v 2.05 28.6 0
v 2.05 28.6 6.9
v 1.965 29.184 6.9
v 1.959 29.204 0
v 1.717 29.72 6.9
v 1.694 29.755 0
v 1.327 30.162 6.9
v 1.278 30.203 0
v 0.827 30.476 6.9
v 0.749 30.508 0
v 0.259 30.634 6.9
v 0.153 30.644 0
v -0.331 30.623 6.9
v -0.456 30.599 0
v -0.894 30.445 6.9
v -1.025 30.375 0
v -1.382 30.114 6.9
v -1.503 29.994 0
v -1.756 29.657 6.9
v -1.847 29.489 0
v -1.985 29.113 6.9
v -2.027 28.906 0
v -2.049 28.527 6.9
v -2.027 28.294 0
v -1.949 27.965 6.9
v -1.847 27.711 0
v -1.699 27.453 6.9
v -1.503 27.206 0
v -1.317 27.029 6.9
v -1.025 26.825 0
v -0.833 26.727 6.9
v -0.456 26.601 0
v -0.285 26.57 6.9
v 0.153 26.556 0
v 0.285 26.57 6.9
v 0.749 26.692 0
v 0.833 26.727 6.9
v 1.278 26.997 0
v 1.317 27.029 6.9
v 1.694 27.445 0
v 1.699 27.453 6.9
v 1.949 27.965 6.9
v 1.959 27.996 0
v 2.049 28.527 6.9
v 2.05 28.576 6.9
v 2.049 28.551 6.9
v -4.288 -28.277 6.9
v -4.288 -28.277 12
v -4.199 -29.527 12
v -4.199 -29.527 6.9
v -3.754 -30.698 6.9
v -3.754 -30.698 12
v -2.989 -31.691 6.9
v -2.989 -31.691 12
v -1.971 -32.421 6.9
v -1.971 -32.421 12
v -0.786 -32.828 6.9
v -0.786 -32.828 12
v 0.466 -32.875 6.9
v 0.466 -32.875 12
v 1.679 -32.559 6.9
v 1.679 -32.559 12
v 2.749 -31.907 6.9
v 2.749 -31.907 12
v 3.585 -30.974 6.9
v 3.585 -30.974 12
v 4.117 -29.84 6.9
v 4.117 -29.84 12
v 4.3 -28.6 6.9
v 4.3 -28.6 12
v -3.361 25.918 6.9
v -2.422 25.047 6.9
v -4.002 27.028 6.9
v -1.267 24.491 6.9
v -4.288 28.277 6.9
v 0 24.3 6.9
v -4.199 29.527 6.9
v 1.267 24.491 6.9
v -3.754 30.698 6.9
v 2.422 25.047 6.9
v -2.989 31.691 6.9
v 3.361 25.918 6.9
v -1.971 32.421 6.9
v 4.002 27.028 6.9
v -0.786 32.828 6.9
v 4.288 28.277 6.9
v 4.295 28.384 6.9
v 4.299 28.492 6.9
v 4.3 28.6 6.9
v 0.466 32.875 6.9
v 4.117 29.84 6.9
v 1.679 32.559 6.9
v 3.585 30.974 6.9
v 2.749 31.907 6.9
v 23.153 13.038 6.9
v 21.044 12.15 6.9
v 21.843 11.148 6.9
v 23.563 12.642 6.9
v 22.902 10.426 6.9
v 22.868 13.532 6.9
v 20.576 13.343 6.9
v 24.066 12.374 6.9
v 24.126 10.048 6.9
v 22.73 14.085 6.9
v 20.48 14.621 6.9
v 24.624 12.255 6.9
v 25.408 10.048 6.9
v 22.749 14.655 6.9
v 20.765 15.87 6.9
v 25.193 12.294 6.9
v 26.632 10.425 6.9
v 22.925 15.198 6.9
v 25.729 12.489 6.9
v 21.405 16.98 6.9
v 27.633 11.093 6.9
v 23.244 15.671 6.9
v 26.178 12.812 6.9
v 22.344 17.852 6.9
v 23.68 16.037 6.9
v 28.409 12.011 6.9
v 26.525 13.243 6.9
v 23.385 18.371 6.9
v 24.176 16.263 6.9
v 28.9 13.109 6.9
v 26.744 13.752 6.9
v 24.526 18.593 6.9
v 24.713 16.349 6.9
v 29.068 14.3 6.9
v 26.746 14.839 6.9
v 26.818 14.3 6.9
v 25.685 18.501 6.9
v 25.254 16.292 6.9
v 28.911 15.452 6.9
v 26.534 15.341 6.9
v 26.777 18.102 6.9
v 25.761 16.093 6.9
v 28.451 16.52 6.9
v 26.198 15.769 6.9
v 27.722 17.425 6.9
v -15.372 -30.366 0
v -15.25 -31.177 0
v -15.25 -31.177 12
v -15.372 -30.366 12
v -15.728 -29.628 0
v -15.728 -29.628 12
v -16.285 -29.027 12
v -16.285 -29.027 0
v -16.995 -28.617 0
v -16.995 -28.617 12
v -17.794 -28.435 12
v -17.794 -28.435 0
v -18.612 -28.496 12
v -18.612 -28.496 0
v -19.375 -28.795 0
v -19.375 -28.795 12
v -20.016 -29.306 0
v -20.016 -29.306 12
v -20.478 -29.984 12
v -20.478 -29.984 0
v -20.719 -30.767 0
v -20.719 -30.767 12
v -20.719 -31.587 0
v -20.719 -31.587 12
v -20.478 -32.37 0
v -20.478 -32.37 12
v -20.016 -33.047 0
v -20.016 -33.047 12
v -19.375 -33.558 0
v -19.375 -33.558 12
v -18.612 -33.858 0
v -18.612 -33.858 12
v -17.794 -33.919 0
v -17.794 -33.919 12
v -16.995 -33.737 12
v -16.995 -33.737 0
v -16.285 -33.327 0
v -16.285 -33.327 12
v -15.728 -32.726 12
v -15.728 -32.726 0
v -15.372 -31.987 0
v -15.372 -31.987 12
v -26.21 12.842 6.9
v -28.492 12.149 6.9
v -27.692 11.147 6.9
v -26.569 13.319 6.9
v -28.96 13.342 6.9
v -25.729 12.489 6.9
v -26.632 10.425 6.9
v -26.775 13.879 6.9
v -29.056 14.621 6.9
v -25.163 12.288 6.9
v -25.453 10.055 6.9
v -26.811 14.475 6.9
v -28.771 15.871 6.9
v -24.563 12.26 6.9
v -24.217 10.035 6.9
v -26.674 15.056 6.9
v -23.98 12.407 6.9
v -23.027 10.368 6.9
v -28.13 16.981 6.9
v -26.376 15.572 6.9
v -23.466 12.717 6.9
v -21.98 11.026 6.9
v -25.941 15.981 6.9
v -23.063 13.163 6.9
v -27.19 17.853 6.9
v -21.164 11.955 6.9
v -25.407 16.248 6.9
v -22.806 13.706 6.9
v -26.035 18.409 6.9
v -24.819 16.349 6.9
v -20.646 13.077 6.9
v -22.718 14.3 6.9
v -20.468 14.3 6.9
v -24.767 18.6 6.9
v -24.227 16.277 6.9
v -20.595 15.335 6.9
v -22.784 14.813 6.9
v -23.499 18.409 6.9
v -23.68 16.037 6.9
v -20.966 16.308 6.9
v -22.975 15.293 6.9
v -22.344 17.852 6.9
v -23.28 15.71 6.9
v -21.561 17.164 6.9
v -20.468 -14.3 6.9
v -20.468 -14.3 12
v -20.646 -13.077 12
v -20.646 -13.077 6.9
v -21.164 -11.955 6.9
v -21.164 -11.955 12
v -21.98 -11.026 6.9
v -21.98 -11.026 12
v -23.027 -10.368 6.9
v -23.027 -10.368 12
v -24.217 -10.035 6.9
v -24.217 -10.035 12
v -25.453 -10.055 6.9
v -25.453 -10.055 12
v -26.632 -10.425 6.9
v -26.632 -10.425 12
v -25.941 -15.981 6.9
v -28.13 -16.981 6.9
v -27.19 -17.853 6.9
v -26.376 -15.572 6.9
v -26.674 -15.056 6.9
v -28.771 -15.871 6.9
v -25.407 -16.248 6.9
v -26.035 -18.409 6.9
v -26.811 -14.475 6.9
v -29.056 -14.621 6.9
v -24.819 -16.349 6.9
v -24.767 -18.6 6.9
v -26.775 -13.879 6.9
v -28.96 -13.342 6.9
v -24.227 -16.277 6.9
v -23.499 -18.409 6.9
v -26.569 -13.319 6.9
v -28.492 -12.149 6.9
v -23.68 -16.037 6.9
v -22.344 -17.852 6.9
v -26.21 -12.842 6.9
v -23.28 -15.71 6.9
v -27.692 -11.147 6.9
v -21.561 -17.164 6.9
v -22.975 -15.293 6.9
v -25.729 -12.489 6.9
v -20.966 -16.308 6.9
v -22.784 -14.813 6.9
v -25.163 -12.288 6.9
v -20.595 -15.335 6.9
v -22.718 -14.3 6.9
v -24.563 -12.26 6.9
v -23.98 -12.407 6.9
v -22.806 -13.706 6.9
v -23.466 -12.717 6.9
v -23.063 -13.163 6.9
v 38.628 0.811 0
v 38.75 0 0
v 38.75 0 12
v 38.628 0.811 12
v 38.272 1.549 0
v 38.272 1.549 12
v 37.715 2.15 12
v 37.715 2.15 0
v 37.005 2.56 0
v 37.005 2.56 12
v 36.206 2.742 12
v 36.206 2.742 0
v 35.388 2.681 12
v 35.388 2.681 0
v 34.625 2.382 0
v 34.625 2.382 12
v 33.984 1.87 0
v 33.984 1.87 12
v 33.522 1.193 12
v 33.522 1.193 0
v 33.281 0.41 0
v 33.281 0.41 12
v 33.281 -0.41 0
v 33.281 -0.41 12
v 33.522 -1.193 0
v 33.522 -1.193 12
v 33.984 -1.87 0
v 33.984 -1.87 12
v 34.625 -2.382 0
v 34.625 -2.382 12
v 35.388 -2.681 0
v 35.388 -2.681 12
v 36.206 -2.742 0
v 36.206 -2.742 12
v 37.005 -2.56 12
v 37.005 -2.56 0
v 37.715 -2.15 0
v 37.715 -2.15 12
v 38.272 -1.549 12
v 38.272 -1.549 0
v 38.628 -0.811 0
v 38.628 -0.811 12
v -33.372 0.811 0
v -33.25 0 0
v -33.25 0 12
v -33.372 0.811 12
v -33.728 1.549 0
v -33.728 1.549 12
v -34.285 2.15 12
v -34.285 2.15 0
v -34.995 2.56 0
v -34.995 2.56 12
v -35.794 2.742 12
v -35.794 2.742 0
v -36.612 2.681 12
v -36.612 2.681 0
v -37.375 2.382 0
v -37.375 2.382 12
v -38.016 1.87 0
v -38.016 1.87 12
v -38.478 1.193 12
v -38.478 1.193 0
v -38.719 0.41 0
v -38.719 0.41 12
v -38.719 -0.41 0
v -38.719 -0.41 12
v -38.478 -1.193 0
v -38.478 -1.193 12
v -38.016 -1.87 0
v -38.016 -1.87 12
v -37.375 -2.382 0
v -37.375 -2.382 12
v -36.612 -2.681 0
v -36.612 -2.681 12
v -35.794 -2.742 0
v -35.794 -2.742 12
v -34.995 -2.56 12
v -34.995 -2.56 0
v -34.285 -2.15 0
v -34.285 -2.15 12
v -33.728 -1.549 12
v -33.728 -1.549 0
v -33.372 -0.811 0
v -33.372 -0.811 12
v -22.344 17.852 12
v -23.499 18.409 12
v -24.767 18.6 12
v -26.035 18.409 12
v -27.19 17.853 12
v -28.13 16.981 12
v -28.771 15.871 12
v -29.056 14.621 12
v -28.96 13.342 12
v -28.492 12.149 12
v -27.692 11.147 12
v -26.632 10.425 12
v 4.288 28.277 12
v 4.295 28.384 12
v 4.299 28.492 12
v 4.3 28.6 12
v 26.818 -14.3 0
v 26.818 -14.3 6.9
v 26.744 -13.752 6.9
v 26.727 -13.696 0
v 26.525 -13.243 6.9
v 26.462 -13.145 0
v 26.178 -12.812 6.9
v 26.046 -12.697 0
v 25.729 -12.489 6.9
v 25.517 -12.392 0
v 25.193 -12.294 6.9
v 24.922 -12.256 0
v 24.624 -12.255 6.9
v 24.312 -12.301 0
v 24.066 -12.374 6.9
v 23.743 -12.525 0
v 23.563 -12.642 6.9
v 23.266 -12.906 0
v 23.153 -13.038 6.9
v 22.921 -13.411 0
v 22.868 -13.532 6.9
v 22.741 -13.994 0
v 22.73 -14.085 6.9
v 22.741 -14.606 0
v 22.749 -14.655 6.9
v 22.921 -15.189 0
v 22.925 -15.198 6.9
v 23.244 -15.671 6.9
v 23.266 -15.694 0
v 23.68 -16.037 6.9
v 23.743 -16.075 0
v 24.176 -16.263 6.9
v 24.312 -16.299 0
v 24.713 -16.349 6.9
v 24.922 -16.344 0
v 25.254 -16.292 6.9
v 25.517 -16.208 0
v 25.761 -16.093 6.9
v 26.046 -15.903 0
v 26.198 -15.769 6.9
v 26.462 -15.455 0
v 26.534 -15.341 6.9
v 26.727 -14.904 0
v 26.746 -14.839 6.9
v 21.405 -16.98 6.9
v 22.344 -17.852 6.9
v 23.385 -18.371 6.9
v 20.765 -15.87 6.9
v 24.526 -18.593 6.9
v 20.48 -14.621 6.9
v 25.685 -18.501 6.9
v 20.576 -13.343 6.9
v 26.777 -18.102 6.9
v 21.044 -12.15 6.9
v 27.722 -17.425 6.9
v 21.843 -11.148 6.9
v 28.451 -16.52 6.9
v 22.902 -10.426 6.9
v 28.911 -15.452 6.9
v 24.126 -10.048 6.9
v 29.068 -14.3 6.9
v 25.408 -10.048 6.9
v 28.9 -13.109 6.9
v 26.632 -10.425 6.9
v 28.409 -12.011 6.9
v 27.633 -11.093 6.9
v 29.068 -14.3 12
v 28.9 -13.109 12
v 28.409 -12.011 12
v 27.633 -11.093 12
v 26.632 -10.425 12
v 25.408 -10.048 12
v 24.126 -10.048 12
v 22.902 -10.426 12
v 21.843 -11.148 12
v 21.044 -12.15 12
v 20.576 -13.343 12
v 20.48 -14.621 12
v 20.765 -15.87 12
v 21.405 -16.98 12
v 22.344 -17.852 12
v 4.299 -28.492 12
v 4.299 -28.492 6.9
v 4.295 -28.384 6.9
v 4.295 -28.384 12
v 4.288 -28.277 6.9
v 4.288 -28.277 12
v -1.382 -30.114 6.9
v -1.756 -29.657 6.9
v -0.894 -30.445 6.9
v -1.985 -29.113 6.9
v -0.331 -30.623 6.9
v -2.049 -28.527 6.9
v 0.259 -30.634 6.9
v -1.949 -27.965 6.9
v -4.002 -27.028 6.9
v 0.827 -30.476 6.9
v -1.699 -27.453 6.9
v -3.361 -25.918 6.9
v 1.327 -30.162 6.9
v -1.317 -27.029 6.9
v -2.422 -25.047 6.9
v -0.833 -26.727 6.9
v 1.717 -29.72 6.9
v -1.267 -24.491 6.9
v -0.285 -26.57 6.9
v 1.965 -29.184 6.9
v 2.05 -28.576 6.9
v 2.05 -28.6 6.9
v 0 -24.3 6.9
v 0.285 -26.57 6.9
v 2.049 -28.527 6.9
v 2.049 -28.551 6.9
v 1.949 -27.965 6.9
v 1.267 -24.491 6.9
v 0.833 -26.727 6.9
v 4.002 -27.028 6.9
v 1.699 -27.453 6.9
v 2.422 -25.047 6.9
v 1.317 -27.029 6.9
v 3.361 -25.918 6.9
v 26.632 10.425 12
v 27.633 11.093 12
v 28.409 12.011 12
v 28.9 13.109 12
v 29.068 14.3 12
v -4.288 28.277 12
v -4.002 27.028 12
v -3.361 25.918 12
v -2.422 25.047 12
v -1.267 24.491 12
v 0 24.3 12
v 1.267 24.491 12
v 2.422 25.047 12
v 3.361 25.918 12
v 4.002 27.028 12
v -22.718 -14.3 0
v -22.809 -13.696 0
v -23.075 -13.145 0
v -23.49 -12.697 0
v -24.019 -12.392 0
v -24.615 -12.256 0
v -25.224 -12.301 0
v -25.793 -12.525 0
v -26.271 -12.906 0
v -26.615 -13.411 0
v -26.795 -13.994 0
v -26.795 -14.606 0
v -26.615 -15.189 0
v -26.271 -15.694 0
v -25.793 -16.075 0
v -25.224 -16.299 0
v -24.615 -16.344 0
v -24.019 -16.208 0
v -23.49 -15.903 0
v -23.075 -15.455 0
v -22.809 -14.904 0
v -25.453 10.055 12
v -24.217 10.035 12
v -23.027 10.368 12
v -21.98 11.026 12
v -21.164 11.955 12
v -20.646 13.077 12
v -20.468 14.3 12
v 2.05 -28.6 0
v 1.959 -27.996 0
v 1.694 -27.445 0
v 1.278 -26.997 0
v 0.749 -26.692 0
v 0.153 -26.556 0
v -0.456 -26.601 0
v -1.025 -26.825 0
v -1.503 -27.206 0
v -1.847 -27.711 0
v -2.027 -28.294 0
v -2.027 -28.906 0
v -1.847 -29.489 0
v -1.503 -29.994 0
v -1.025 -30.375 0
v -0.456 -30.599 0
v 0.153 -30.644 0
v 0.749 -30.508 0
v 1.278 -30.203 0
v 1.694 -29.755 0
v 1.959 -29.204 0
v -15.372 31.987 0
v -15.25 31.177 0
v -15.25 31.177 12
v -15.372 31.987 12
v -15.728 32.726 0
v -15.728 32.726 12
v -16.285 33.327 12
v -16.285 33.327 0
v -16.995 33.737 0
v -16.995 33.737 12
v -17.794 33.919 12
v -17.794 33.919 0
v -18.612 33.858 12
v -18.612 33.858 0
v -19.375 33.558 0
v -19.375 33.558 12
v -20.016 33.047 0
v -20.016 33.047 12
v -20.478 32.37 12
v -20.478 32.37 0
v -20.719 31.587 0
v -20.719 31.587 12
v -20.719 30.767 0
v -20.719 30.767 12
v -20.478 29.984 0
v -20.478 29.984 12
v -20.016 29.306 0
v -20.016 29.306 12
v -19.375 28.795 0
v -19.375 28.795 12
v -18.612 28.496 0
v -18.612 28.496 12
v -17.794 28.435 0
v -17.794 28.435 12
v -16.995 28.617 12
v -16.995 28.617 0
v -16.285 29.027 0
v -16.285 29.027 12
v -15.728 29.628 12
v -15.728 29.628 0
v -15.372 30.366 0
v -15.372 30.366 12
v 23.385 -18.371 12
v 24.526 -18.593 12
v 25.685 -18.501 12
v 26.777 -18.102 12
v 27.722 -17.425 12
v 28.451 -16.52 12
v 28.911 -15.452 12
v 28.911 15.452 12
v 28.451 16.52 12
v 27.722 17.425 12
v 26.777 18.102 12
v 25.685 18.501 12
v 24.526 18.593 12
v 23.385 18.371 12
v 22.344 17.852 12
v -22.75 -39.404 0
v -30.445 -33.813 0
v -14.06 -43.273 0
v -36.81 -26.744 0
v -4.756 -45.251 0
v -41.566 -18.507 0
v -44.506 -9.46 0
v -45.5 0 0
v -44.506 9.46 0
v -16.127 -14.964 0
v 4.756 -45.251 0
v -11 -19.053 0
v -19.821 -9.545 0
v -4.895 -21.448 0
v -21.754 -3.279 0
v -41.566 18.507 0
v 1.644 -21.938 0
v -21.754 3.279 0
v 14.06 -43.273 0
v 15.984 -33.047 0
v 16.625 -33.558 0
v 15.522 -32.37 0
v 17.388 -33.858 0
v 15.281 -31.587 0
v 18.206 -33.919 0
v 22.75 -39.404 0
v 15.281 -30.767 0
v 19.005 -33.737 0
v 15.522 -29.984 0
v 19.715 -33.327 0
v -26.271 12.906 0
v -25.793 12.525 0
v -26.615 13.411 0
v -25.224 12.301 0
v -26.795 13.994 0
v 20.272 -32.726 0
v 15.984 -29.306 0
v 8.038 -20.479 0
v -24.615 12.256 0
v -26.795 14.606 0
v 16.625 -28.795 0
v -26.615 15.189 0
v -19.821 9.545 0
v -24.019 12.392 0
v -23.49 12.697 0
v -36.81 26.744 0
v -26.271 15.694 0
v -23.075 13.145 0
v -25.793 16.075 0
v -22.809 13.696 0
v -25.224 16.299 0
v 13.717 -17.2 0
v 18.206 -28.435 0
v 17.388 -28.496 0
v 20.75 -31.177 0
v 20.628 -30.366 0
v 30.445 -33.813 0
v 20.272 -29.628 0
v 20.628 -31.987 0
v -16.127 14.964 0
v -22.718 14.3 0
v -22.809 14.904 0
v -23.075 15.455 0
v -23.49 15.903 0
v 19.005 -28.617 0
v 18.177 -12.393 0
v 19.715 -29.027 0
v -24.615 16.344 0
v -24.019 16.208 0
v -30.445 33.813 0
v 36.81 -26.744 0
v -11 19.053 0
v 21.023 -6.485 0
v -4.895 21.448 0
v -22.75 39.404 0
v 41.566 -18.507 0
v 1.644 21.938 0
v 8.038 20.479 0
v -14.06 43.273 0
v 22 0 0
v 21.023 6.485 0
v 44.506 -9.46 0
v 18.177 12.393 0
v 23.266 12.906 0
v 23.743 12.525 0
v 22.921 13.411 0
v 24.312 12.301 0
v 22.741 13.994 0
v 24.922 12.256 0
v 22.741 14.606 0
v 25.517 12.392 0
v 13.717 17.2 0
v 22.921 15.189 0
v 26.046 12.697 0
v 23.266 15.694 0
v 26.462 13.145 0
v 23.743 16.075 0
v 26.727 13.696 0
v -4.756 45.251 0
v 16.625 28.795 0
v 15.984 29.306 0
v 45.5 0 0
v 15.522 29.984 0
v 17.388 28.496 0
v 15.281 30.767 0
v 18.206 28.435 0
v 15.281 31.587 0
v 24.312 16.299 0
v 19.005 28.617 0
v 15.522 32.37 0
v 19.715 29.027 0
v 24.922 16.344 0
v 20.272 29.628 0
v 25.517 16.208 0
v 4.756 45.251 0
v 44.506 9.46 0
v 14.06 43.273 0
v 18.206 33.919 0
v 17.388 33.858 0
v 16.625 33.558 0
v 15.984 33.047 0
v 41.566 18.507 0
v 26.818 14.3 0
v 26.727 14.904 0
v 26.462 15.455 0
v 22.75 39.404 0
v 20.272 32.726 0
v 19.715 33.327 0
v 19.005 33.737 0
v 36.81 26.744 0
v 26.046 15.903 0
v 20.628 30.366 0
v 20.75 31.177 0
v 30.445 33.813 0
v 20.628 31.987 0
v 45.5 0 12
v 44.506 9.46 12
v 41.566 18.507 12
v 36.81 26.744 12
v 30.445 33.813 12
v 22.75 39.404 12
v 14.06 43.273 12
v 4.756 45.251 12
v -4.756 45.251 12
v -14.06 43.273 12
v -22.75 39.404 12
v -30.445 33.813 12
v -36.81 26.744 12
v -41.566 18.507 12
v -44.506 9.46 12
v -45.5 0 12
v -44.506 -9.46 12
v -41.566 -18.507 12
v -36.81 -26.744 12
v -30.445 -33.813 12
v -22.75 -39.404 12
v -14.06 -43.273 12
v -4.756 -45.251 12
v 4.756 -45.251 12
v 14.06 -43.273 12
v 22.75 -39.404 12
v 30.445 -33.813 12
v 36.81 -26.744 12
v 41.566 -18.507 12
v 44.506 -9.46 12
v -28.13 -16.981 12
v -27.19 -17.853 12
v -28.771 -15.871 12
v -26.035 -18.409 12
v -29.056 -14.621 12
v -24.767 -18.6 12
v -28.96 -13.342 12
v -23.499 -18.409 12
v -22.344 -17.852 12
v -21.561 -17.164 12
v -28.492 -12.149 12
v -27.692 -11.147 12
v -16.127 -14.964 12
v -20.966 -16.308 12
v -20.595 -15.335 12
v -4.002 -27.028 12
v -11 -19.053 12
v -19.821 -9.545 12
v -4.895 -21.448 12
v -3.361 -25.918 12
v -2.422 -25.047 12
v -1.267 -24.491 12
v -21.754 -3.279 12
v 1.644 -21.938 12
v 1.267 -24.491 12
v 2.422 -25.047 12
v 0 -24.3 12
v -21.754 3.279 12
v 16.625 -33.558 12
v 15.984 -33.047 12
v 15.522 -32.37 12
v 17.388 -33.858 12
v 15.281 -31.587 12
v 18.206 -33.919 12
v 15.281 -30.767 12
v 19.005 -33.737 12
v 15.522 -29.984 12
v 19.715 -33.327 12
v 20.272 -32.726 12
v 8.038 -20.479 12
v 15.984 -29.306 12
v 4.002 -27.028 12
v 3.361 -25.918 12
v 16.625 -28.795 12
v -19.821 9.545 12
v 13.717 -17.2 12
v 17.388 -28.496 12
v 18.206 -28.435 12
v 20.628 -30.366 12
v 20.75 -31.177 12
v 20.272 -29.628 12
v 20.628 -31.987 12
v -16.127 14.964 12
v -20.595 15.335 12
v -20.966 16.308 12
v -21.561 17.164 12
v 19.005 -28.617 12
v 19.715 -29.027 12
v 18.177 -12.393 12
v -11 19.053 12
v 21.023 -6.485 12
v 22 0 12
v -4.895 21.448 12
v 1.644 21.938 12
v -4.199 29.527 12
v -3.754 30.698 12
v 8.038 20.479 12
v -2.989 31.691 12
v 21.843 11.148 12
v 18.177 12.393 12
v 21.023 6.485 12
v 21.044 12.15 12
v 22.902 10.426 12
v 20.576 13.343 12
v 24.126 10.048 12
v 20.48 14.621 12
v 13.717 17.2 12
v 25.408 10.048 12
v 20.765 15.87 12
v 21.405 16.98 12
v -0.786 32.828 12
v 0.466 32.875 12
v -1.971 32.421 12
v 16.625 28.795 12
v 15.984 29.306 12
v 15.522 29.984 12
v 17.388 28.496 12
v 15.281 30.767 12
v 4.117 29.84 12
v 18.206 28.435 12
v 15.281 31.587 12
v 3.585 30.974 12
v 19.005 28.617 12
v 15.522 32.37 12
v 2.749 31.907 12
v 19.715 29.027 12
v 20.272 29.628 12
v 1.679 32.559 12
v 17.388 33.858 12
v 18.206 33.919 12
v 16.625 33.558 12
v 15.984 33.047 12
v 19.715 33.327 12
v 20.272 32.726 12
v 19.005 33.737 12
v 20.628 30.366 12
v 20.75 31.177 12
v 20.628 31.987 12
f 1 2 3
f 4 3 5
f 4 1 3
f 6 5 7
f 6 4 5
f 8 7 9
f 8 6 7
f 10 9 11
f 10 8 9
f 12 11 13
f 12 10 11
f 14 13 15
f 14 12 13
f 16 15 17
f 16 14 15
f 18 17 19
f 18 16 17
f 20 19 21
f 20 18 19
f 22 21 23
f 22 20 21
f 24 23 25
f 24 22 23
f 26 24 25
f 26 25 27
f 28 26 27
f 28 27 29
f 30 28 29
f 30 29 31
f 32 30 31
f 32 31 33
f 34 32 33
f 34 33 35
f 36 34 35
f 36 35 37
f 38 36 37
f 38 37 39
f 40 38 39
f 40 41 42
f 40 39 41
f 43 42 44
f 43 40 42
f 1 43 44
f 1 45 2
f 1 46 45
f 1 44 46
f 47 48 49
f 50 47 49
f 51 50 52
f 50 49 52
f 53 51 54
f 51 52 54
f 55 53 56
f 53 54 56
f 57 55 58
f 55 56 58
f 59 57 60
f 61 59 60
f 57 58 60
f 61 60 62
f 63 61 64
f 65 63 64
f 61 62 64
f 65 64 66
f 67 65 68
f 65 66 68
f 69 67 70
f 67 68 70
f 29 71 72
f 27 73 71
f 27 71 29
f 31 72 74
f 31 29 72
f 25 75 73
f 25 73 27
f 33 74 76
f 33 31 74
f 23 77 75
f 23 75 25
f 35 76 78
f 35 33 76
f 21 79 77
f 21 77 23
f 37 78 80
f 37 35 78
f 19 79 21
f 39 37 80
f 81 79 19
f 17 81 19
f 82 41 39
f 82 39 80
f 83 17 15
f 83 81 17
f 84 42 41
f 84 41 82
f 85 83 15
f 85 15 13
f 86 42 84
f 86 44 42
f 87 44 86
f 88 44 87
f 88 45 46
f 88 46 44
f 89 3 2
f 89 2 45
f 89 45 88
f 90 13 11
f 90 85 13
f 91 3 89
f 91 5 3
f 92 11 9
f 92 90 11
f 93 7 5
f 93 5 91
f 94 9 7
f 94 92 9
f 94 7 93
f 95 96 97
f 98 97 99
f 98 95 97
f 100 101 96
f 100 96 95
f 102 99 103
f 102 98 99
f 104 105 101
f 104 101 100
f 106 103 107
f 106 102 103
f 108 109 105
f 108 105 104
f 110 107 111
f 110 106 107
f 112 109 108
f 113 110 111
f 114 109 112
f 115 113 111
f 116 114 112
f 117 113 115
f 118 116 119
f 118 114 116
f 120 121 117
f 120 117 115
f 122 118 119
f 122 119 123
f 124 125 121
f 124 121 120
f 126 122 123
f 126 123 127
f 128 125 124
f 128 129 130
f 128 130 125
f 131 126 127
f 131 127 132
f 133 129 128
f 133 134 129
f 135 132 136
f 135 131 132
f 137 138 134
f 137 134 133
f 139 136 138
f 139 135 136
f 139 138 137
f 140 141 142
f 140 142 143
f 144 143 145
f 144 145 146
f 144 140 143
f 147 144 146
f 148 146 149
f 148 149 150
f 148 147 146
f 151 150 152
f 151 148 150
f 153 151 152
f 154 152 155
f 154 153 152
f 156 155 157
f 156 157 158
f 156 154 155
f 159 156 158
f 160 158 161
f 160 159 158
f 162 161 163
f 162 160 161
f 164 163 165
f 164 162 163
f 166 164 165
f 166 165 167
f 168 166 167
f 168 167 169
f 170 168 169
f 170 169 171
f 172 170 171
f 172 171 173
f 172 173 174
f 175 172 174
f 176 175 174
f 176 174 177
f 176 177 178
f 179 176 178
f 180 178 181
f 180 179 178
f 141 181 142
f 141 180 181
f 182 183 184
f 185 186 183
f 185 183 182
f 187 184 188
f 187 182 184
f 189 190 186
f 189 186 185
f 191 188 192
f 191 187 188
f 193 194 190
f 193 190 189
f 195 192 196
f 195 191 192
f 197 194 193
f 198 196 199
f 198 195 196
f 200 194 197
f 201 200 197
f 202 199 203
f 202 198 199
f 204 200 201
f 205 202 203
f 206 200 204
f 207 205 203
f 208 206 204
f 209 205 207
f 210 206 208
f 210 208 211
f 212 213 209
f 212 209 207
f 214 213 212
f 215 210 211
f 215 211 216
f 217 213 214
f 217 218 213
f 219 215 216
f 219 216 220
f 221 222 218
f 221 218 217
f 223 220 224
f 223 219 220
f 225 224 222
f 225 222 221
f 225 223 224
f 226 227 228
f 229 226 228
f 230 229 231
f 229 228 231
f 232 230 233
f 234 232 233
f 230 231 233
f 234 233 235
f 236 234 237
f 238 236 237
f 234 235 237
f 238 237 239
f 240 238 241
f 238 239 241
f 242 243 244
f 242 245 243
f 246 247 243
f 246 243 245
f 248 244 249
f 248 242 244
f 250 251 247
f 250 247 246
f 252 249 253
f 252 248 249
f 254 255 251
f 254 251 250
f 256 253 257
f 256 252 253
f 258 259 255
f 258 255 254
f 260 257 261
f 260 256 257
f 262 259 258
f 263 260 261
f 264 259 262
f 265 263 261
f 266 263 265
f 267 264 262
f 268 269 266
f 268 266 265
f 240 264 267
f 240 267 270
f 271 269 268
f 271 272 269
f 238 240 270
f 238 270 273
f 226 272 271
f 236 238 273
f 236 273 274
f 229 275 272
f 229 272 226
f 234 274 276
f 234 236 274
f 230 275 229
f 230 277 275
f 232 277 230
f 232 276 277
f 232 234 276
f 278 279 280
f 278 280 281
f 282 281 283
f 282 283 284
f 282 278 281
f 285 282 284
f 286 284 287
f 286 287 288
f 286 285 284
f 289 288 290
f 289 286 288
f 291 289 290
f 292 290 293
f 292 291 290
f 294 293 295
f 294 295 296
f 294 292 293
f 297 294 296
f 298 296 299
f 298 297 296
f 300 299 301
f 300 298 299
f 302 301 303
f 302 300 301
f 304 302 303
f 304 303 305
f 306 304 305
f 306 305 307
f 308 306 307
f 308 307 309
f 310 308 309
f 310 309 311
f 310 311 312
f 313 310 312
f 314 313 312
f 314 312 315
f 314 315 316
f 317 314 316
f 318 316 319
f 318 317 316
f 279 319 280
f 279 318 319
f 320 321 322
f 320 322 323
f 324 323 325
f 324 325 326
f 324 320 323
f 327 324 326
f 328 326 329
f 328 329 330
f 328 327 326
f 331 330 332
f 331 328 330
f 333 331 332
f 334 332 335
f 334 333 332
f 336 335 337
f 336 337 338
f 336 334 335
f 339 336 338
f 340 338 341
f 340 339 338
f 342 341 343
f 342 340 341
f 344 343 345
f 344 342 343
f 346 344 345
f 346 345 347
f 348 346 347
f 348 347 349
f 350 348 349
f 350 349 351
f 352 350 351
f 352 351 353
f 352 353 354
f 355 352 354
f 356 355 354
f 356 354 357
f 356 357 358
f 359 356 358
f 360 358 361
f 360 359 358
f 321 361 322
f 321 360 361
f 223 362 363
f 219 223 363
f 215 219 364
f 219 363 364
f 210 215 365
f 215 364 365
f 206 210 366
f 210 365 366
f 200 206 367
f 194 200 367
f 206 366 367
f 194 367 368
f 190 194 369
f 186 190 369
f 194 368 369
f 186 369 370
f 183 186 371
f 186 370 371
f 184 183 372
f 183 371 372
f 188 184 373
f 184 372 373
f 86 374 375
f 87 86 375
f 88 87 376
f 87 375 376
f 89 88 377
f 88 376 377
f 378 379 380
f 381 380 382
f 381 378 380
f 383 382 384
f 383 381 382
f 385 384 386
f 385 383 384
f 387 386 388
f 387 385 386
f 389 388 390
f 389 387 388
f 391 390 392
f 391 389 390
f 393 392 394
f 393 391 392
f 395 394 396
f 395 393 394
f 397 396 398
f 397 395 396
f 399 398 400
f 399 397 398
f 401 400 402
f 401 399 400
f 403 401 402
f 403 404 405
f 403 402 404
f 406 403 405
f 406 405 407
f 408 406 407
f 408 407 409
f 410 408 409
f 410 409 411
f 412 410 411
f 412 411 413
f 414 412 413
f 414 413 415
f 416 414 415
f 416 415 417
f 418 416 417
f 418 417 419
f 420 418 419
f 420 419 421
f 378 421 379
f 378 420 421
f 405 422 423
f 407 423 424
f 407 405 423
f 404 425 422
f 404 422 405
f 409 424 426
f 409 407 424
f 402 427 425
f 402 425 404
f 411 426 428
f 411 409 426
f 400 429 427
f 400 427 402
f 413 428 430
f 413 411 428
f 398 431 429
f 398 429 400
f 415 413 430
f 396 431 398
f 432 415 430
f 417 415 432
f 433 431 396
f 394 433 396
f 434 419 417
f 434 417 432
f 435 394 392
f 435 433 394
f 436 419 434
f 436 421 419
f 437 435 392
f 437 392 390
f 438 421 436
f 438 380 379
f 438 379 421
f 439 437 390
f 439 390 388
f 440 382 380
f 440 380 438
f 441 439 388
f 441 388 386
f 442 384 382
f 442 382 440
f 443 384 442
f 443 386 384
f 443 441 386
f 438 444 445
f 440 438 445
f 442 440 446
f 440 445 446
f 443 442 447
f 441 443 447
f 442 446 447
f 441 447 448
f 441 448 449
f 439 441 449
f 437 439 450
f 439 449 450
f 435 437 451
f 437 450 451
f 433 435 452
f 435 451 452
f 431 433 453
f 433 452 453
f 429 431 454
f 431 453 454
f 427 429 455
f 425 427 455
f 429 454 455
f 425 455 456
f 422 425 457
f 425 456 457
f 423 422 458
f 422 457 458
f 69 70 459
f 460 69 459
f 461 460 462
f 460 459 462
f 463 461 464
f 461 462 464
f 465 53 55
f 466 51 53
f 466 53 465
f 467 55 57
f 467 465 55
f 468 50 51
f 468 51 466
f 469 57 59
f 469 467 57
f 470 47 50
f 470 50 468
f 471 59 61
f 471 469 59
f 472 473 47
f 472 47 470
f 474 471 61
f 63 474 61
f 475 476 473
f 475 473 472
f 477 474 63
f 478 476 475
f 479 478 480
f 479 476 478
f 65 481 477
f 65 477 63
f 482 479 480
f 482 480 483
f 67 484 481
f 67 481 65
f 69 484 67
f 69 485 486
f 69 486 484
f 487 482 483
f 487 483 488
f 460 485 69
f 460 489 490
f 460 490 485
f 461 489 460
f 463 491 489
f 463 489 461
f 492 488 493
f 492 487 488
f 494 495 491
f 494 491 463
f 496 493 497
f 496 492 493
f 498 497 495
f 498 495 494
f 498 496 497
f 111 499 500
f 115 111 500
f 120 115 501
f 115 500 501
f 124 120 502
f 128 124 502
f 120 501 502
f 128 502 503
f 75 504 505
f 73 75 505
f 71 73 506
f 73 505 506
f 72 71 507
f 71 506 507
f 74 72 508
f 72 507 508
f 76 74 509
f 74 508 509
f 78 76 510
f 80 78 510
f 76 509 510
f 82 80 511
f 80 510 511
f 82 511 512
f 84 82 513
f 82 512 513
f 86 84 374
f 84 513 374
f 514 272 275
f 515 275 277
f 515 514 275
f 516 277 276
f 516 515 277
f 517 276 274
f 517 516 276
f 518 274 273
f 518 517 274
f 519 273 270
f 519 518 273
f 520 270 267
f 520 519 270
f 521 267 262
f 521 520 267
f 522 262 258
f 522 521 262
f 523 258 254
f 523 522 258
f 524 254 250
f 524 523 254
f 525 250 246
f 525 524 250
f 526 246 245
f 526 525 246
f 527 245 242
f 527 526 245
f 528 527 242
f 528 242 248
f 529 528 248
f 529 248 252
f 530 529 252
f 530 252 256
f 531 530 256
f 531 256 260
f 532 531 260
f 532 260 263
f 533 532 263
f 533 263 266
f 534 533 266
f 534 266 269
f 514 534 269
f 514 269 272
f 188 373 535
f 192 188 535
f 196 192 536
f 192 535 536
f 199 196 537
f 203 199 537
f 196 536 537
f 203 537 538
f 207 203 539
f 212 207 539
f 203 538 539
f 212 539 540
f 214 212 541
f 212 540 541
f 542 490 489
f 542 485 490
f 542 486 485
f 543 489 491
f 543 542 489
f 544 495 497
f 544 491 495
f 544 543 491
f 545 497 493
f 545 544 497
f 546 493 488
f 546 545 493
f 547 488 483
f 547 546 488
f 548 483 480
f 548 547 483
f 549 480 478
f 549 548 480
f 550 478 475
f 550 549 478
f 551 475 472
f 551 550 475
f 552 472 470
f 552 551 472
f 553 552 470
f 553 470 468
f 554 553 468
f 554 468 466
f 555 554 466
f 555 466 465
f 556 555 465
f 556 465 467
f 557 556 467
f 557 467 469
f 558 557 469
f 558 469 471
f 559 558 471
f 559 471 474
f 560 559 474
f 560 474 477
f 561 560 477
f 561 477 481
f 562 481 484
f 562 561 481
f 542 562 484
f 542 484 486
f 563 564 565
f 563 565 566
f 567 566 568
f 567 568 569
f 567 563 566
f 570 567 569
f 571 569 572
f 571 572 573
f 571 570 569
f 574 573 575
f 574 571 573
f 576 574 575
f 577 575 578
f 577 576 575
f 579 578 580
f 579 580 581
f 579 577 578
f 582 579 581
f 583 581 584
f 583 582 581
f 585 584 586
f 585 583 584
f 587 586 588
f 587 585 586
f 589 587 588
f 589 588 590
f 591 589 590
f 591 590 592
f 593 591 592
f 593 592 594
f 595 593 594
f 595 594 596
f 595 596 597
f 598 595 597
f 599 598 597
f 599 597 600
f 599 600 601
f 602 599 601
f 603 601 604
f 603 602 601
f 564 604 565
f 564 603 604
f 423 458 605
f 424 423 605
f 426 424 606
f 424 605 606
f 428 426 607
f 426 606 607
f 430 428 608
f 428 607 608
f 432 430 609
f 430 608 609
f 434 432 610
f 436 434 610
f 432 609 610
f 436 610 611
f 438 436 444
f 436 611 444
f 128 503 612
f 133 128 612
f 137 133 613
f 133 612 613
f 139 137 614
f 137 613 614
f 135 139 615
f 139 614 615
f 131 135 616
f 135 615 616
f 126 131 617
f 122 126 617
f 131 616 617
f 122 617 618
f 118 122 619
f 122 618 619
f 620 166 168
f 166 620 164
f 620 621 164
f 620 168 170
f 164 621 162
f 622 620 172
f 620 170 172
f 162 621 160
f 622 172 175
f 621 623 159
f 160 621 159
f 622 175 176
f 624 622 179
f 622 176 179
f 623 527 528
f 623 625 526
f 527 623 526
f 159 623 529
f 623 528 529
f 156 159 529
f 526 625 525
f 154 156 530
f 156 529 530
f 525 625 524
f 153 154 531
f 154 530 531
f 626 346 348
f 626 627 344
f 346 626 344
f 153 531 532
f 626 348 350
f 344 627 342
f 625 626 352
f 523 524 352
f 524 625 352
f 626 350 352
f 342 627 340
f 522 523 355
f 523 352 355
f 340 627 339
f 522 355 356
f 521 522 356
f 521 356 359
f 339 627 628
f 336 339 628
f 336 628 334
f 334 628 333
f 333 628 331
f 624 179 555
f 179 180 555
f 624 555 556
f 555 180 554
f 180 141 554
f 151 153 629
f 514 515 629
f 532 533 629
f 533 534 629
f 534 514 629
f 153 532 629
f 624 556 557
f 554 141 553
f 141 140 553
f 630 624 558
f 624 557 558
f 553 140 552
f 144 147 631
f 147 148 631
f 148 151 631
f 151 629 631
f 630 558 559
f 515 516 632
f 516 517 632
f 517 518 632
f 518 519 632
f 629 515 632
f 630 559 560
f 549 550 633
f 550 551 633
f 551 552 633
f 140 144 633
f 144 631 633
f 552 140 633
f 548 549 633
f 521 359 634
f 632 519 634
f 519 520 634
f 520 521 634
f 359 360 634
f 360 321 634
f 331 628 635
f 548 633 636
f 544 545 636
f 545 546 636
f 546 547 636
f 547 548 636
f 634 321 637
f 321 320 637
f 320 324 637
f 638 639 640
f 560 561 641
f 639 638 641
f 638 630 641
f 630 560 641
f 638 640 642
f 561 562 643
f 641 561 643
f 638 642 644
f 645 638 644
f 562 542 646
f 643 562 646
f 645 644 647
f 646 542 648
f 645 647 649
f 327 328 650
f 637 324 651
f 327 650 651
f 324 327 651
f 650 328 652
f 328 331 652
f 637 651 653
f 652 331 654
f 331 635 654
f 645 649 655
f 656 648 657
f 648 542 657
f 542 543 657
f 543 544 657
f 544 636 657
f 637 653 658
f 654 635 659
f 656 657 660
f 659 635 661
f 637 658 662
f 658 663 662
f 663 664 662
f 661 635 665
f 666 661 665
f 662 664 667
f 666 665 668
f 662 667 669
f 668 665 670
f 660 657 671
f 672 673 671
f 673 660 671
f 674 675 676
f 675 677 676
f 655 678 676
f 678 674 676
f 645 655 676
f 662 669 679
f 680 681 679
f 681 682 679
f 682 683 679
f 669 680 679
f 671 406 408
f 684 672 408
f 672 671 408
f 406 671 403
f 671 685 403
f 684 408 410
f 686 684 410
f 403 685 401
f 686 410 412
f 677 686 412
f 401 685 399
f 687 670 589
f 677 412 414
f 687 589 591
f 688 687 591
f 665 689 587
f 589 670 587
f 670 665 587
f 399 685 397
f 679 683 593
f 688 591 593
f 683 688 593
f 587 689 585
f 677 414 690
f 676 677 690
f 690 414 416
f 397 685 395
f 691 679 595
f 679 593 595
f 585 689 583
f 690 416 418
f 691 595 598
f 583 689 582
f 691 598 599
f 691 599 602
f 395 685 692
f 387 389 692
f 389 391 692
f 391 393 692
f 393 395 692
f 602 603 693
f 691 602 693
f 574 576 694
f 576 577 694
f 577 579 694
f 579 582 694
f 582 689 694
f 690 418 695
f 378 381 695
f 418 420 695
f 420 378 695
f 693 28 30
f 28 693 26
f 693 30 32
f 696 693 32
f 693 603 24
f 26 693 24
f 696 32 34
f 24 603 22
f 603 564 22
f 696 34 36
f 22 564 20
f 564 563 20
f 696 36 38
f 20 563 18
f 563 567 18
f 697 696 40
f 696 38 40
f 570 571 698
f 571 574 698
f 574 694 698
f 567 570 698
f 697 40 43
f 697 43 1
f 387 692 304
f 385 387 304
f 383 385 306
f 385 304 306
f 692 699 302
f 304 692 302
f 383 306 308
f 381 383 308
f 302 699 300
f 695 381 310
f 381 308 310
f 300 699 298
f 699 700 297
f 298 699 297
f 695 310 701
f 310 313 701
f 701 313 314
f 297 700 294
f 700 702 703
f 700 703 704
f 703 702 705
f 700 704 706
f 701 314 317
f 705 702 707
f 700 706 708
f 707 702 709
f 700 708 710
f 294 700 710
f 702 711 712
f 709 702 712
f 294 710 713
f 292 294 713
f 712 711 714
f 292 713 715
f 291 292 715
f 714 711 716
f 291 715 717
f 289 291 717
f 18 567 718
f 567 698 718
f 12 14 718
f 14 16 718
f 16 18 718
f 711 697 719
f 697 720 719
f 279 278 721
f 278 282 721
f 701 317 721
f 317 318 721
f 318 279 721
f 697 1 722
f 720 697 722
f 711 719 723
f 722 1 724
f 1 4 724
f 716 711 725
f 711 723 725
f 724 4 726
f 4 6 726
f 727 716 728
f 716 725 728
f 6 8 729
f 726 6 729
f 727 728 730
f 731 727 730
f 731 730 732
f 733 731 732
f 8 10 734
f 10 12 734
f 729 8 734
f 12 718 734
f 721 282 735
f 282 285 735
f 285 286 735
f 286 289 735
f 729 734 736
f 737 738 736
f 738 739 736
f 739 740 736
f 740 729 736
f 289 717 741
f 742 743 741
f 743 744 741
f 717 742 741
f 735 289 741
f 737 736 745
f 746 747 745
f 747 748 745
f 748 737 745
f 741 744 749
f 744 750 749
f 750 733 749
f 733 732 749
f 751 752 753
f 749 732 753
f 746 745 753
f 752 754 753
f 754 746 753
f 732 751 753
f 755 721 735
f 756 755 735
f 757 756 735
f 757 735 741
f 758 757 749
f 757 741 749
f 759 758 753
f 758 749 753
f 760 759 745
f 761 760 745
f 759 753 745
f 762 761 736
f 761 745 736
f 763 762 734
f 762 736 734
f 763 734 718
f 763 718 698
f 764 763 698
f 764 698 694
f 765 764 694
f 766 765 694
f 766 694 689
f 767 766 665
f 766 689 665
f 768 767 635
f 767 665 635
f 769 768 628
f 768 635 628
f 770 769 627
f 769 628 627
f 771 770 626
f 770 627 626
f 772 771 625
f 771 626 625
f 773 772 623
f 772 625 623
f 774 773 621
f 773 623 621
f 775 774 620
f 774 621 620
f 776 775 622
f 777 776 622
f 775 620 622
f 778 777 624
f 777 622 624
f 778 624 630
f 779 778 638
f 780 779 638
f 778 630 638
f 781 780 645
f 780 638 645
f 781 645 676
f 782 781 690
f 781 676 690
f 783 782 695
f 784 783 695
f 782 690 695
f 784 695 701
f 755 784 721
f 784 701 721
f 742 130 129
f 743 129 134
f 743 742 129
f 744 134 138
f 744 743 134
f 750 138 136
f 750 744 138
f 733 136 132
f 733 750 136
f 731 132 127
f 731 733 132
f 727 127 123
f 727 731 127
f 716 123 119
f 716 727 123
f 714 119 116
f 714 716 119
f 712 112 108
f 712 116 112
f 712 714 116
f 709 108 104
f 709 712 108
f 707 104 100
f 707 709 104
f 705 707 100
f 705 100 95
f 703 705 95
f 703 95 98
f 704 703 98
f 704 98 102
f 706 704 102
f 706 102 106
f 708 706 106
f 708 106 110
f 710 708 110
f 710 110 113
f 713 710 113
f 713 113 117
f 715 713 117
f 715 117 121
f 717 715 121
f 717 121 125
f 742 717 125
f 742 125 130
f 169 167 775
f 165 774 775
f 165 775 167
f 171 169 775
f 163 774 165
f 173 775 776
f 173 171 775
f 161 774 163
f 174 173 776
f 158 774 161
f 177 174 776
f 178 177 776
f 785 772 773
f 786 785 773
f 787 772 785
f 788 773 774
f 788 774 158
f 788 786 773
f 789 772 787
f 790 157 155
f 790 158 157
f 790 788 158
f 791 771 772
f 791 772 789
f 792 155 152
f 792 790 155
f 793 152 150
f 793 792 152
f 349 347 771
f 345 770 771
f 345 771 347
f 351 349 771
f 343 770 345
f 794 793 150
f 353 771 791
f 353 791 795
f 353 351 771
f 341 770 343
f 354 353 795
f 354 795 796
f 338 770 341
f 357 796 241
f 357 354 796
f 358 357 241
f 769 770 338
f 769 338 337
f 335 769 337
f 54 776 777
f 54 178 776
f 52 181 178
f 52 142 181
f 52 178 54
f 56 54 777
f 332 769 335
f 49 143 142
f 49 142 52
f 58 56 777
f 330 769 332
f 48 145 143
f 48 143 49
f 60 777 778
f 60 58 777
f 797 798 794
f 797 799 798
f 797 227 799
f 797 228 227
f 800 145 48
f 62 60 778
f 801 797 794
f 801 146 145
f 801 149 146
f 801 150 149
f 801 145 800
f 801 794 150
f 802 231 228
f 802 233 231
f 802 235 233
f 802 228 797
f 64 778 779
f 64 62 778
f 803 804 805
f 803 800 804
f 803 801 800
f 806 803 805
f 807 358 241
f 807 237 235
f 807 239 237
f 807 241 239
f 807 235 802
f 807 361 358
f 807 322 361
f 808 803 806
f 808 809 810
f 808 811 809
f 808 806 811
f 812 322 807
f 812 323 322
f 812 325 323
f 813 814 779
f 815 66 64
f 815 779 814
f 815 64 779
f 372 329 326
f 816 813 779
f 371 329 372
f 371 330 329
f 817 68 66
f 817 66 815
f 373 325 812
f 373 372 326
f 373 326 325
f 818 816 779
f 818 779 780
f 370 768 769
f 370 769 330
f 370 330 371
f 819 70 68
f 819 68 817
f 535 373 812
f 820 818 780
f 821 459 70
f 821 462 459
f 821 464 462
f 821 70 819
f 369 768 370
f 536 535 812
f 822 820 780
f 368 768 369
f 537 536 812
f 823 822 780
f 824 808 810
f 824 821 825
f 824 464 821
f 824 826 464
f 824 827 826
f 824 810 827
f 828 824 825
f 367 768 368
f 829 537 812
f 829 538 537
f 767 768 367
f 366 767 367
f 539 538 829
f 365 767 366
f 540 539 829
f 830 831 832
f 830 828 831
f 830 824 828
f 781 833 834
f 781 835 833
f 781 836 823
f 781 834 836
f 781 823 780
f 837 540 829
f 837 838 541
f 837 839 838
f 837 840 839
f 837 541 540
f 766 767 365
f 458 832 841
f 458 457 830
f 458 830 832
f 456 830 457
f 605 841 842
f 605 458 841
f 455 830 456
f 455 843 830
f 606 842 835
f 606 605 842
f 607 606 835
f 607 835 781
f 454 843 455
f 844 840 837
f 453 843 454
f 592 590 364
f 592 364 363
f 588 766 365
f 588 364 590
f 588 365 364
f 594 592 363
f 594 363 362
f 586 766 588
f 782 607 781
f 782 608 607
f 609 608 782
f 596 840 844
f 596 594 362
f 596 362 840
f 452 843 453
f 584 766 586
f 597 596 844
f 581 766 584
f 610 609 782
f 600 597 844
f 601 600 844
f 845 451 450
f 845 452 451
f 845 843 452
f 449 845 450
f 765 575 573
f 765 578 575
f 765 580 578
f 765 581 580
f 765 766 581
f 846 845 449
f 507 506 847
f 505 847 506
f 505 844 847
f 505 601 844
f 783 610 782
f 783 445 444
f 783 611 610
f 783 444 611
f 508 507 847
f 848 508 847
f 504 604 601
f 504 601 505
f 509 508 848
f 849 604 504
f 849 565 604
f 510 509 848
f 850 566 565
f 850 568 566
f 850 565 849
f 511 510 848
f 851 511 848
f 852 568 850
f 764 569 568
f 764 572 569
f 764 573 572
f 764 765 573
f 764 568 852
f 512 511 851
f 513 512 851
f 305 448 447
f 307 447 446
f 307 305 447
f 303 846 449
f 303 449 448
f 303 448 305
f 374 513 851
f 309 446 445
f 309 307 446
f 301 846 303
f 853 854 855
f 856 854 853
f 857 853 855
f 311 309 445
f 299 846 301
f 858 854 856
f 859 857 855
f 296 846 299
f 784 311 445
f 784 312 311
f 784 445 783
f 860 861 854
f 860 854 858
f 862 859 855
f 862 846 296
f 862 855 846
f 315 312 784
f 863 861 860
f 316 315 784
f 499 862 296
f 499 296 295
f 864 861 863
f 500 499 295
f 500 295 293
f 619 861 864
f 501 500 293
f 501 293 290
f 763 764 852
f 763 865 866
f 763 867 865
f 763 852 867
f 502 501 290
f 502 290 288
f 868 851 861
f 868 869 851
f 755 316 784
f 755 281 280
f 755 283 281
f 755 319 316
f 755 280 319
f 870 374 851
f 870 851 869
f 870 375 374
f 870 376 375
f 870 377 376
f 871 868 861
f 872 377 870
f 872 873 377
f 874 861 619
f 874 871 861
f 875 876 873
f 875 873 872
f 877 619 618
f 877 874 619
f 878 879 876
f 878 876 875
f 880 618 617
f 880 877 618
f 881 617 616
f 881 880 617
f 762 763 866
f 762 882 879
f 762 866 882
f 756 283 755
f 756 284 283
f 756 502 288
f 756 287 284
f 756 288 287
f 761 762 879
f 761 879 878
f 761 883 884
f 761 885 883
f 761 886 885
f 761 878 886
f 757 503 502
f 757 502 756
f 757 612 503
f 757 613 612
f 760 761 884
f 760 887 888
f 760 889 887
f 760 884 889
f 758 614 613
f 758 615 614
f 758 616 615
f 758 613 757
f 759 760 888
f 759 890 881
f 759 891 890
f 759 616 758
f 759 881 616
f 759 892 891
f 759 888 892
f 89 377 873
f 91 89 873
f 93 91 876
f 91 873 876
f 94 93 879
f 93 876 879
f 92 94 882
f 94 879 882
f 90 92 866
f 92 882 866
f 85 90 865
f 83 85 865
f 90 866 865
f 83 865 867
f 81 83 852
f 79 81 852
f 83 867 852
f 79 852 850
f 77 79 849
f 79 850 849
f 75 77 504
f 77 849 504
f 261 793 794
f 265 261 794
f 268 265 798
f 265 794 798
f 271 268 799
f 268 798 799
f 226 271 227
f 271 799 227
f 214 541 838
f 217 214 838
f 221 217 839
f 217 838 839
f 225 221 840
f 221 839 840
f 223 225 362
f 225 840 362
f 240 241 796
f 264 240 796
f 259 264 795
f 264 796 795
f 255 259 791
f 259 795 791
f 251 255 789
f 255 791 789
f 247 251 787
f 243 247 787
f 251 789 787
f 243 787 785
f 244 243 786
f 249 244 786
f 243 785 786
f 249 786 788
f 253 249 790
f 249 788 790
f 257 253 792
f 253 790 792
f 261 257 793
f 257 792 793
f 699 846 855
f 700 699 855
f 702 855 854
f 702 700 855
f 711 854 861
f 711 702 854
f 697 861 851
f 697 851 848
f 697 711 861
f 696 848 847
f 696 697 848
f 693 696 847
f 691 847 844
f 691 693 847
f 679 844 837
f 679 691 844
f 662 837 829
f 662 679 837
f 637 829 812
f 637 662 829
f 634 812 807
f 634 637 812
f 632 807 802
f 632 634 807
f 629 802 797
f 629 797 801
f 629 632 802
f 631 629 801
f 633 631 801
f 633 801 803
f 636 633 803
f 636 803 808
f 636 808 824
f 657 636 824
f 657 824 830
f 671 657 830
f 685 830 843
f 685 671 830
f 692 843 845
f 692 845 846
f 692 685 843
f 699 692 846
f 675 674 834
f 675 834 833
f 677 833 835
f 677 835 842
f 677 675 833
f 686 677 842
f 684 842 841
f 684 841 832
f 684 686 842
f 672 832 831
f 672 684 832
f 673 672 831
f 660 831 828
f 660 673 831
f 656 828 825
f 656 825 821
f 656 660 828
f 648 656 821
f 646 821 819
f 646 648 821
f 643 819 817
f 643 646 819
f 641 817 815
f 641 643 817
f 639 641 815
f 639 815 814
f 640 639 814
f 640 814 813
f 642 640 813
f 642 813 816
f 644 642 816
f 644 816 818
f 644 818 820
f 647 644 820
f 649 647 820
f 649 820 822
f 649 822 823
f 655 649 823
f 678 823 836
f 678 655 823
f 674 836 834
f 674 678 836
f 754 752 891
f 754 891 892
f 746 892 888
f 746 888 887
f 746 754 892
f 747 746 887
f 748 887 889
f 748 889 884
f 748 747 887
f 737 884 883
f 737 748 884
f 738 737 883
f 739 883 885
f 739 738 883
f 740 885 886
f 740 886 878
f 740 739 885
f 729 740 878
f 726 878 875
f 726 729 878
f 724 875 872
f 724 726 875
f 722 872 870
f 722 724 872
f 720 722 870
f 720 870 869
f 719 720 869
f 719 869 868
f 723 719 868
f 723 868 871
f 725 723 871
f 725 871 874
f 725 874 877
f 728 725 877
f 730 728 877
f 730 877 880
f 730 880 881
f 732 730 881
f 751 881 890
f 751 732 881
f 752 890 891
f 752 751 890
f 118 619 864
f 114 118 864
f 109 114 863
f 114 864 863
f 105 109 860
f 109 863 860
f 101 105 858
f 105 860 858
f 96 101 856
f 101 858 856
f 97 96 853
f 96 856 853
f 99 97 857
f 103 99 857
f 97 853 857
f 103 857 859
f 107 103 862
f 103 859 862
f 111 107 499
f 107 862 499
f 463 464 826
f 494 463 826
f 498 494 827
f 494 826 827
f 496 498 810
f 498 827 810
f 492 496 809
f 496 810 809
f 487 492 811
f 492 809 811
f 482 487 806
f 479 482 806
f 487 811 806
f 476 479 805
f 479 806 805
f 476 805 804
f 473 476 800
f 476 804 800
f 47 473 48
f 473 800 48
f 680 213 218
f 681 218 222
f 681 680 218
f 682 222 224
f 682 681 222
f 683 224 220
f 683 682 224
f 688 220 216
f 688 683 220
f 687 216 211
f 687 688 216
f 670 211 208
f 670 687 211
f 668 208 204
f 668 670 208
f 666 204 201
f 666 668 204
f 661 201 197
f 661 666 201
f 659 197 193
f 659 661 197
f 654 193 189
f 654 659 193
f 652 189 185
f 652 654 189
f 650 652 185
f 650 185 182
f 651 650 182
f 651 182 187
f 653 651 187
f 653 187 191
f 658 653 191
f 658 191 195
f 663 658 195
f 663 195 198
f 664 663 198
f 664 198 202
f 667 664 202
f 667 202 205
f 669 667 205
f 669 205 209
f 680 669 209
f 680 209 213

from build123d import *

# Parameters (mm, degrees)
F0_R     = 45.5
F0_R_2   = 2.75
F0_R_3   = 2.05
F0_R_4   = 22
F1_DEPTH = 12
F3_DEPTH = 5.1


# Not quite as in the source:
# - a feature names something its author has since deleted; it is built from what else it names


with BuildPart() as f1:
    # F0 (on Top) → F1 (new body)
    with BuildSketch(Plane.XY):
        Circle(F0_R)
        with Locations((-18, -31.1769145362)):
            Circle(F0_R_2, mode=Mode.SUBTRACT)
        with Locations((-24.7683265482, -14.3)):
            Circle(F0_R_3, mode=Mode.SUBTRACT)
        with Locations((0, -28.6)):
            Circle(F0_R_3, mode=Mode.SUBTRACT)
        with Locations((18, -31.1769145362)):
            Circle(F0_R_2, mode=Mode.SUBTRACT)
        with Locations((24.7683265482, -14.3)):
            Circle(F0_R_3, mode=Mode.SUBTRACT)
        with Locations((-36, 0)):
            Circle(F0_R_2, mode=Mode.SUBTRACT)
        with Locations((-24.7683265482, 14.3)):
            Circle(F0_R_3, mode=Mode.SUBTRACT)
        with Locations((-18, 31.1769145362)):
            Circle(F0_R_2, mode=Mode.SUBTRACT)
        Circle(F0_R_4, mode=Mode.SUBTRACT)
        with Locations((36, 0)):
            Circle(F0_R_2, mode=Mode.SUBTRACT)
        with Locations((24.7683265482, 14.3)):
            Circle(F0_R_3, mode=Mode.SUBTRACT)
        with Locations((0, 28.6)):
            Circle(F0_R_3, mode=Mode.SUBTRACT)
        with Locations((18, 31.1769145362)):
            Circle(F0_R_2, mode=Mode.SUBTRACT)
    extrude(amount=F1_DEPTH)

    # F2 (on face) → F3 (cut)
    with BuildSketch(Plane.XY.offset(12)):
        with BuildLine():
            ThreePointArc((-20.4683265482, 14.3), (-20.9661824008, 16.3084072998), (-22.3444660282, 17.8517460747))
            ThreePointArc((-22.3444660282, 17.8517460747), (-23.0302843715, 16.957771132), (-23.6803579094, 16.0374764001))
            ThreePointArc((-23.6803579094, 16.0374764001), (-22.9748891072, 15.2930166893), (-22.7183265482, 14.3))
            ThreePointArc((-22.7183265482, 14.3), (-23.7116725089, 12.5433036002), (-25.7290409298, 12.4890533202))
            ThreePointArc((-25.7290409298, 12.4890533202), (-26.2010027777, 11.4659257561), (-26.6322986167, 10.425002177))
            ThreePointArc((-26.6322986167, 10.425002177), (-22.4797767776, 10.6595961835), (-20.4683265482, 14.3))
        make_face()
        with BuildLine():
            ThreePointArc((-23.6803579094, 16.0374764001), (-23.0302843715, 16.957771132), (-22.3444660282, 17.8517460747))
            ThreePointArc((-22.3444660282, 17.8517460747), (-28.4922357845, 16.45), (-26.6322986167, 10.425002177))
            ThreePointArc((-26.6322986167, 10.425002177), (-26.2010027777, 11.4659257561), (-25.7290409298, 12.4890533202))
            ThreePointArc((-25.7290409298, 12.4890533202), (-26.543678626, 15.325), (-23.6803579094, 16.0374764001))
        make_face()
        with BuildLine():
            ThreePointArc((2.0486830204, 28.5265297203), (3.1707184061, 28.4236968881), (4.2878325885, 28.2767482517))
            ThreePointArc((4.2878325885, 28.2767482517), (4.2969570705, 28.438259669), (4.3, 28.6))
            ThreePointArc((4.3, 28.6), (-0.161740331, 32.8969570705), (-4.2878325885, 28.2767482517))
            ThreePointArc((-4.2878325885, 28.2767482517), (-3.1707184061, 28.4236968881), (-2.0486830204, 28.5265297203))
            ThreePointArc((-2.0486830204, 28.5265297203), (-0.0367410412, 30.6496707287), (2.05, 28.6))
            ThreePointArc((2.05, 28.6), (2.0496707287, 28.5632589588), (2.0486830204, 28.5265297203))
        make_face()
        with BuildLine():
            ThreePointArc((-4.2878325885, 28.2767482517), (0, 24.3), (4.2878325885, 28.2767482517))
            ThreePointArc((4.2878325885, 28.2767482517), (3.1707184061, 28.4236968881), (2.0486830204, 28.5265297203))
            ThreePointArc((2.0486830204, 28.5265297203), (0, 26.55), (-2.0486830204, 28.5265297203))
            ThreePointArc((-2.0486830204, 28.5265297203), (-3.1707184061, 28.4236968881), (-4.2878325885, 28.2767482517))
        make_face()
        with BuildLine():
            ThreePointArc((25.7290409298, 12.4890533202), (26.2010027777, 11.4659257561), (26.6322986167, 10.425002177))
            ThreePointArc((26.6322986167, 10.425002177), (28.4087303647, 12.0114502293), (29.0683265482, 14.3))
            ThreePointArc((29.0683265482, 14.3), (26.776733848, 18.1021441475), (22.3444660282, 17.8517460747))
            ThreePointArc((22.3444660282, 17.8517460747), (23.0302843715, 16.957771132), (23.6803579094, 16.0374764001))
            ThreePointArc((23.6803579094, 16.0374764001), (25.7613432375, 16.093437441), (26.8183265482, 14.3))
            ThreePointArc((26.8183265482, 14.3), (26.525022948, 13.2433459606), (25.7290409298, 12.4890533202))
        make_face()
        with BuildLine():
            ThreePointArc((22.3444660282, 17.8517460747), (21.044417312, 12.15), (26.6322986167, 10.425002177))
            ThreePointArc((26.6322986167, 10.425002177), (26.2010027777, 11.4659257561), (25.7290409298, 12.4890533202))
            ThreePointArc((25.7290409298, 12.4890533202), (22.9929744705, 13.275), (23.6803579094, 16.0374764001))
            ThreePointArc((23.6803579094, 16.0374764001), (23.0302843715, 16.957771132), (22.3444660282, 17.8517460747))
        make_face()
        with BuildLine():
            ThreePointArc((29.0683265482, -14.3), (28.4087303647, -12.0114502293), (26.6322986167, -10.425002177))
            ThreePointArc((26.6322986167, -10.425002177), (26.2010027777, -11.4659257561), (25.7290409298, -12.4890533202))
            ThreePointArc((25.7290409298, -12.4890533202), (26.525022948, -13.2433459606), (26.8183265482, -14.3))
            ThreePointArc((26.8183265482, -14.3), (25.7613432375, -16.093437441), (23.6803579094, -16.0374764001))
            ThreePointArc((23.6803579094, -16.0374764001), (23.0302843715, -16.957771132), (22.3444660282, -17.8517460747))
            ThreePointArc((22.3444660282, -17.8517460747), (26.776733848, -18.1021441475), (29.0683265482, -14.3))
        make_face()
        with BuildLine():
            ThreePointArc((25.7290409298, -12.4890533202), (26.2010027777, -11.4659257561), (26.6322986167, -10.425002177))
            ThreePointArc((26.6322986167, -10.425002177), (21.044417312, -12.15), (22.3444660282, -17.8517460747))
            ThreePointArc((22.3444660282, -17.8517460747), (23.0302843715, -16.957771132), (23.6803579094, -16.0374764001))
            ThreePointArc((23.6803579094, -16.0374764001), (22.9929744705, -13.275), (25.7290409298, -12.4890533202))
        make_face()
        with BuildLine():
            ThreePointArc((2.0486830204, -28.5265297203), (3.1707184061, -28.4236968881), (4.2878325885, -28.2767482517))
            ThreePointArc((4.2878325885, -28.2767482517), (0, -24.3), (-4.2878325885, -28.2767482517))
            ThreePointArc((-4.2878325885, -28.2767482517), (-3.1707184061, -28.4236968881), (-2.0486830204, -28.5265297203))
            ThreePointArc((-2.0486830204, -28.5265297203), (0, -26.55), (2.0486830204, -28.5265297203))
        make_face()
        with BuildLine():
            ThreePointArc((4.3, -28.6), (4.2969570705, -28.438259669), (4.2878325885, -28.2767482517))
            ThreePointArc((4.2878325885, -28.2767482517), (3.1707184061, -28.4236968881), (2.0486830204, -28.5265297203))
            ThreePointArc((2.0486830204, -28.5265297203), (2.0496707287, -28.5632589588), (2.05, -28.6))
            ThreePointArc((2.05, -28.6), (-0.0367410412, -30.6496707287), (-2.0486830204, -28.5265297203))
            ThreePointArc((-2.0486830204, -28.5265297203), (-3.1707184061, -28.4236968881), (-4.2878325885, -28.2767482517))
            ThreePointArc((-4.2878325885, -28.2767482517), (-0.161740331, -32.8969570705), (4.3, -28.6))
        make_face()
        with BuildLine():
            ThreePointArc((-23.6803579094, -16.0374764001), (-23.0302843715, -16.957771132), (-22.3444660282, -17.8517460747))
            ThreePointArc((-22.3444660282, -17.8517460747), (-20.9661824008, -16.3084072998), (-20.4683265482, -14.3))
            ThreePointArc((-20.4683265482, -14.3), (-22.4797767776, -10.6595961835), (-26.6322986167, -10.425002177))
            ThreePointArc((-26.6322986167, -10.425002177), (-26.2010027777, -11.4659257561), (-25.7290409298, -12.4890533202))
            ThreePointArc((-25.7290409298, -12.4890533202), (-23.7116725089, -12.5433036002), (-22.7183265482, -14.3))
            ThreePointArc((-22.7183265482, -14.3), (-22.9748891072, -15.2930166893), (-23.6803579094, -16.0374764001))
        make_face()
        with BuildLine():
            ThreePointArc((-26.6322986167, -10.425002177), (-28.4922357845, -16.45), (-22.3444660282, -17.8517460747))
            ThreePointArc((-22.3444660282, -17.8517460747), (-23.0302843715, -16.957771132), (-23.6803579094, -16.0374764001))
            ThreePointArc((-23.6803579094, -16.0374764001), (-26.543678626, -15.325), (-25.7290409298, -12.4890533202))
            ThreePointArc((-25.7290409298, -12.4890533202), (-26.2010027777, -11.4659257561), (-26.6322986167, -10.425002177))
        make_face()
    extrude(amount=-F3_DEPTH, mode=Mode.SUBTRACT)


solid = f1.part
